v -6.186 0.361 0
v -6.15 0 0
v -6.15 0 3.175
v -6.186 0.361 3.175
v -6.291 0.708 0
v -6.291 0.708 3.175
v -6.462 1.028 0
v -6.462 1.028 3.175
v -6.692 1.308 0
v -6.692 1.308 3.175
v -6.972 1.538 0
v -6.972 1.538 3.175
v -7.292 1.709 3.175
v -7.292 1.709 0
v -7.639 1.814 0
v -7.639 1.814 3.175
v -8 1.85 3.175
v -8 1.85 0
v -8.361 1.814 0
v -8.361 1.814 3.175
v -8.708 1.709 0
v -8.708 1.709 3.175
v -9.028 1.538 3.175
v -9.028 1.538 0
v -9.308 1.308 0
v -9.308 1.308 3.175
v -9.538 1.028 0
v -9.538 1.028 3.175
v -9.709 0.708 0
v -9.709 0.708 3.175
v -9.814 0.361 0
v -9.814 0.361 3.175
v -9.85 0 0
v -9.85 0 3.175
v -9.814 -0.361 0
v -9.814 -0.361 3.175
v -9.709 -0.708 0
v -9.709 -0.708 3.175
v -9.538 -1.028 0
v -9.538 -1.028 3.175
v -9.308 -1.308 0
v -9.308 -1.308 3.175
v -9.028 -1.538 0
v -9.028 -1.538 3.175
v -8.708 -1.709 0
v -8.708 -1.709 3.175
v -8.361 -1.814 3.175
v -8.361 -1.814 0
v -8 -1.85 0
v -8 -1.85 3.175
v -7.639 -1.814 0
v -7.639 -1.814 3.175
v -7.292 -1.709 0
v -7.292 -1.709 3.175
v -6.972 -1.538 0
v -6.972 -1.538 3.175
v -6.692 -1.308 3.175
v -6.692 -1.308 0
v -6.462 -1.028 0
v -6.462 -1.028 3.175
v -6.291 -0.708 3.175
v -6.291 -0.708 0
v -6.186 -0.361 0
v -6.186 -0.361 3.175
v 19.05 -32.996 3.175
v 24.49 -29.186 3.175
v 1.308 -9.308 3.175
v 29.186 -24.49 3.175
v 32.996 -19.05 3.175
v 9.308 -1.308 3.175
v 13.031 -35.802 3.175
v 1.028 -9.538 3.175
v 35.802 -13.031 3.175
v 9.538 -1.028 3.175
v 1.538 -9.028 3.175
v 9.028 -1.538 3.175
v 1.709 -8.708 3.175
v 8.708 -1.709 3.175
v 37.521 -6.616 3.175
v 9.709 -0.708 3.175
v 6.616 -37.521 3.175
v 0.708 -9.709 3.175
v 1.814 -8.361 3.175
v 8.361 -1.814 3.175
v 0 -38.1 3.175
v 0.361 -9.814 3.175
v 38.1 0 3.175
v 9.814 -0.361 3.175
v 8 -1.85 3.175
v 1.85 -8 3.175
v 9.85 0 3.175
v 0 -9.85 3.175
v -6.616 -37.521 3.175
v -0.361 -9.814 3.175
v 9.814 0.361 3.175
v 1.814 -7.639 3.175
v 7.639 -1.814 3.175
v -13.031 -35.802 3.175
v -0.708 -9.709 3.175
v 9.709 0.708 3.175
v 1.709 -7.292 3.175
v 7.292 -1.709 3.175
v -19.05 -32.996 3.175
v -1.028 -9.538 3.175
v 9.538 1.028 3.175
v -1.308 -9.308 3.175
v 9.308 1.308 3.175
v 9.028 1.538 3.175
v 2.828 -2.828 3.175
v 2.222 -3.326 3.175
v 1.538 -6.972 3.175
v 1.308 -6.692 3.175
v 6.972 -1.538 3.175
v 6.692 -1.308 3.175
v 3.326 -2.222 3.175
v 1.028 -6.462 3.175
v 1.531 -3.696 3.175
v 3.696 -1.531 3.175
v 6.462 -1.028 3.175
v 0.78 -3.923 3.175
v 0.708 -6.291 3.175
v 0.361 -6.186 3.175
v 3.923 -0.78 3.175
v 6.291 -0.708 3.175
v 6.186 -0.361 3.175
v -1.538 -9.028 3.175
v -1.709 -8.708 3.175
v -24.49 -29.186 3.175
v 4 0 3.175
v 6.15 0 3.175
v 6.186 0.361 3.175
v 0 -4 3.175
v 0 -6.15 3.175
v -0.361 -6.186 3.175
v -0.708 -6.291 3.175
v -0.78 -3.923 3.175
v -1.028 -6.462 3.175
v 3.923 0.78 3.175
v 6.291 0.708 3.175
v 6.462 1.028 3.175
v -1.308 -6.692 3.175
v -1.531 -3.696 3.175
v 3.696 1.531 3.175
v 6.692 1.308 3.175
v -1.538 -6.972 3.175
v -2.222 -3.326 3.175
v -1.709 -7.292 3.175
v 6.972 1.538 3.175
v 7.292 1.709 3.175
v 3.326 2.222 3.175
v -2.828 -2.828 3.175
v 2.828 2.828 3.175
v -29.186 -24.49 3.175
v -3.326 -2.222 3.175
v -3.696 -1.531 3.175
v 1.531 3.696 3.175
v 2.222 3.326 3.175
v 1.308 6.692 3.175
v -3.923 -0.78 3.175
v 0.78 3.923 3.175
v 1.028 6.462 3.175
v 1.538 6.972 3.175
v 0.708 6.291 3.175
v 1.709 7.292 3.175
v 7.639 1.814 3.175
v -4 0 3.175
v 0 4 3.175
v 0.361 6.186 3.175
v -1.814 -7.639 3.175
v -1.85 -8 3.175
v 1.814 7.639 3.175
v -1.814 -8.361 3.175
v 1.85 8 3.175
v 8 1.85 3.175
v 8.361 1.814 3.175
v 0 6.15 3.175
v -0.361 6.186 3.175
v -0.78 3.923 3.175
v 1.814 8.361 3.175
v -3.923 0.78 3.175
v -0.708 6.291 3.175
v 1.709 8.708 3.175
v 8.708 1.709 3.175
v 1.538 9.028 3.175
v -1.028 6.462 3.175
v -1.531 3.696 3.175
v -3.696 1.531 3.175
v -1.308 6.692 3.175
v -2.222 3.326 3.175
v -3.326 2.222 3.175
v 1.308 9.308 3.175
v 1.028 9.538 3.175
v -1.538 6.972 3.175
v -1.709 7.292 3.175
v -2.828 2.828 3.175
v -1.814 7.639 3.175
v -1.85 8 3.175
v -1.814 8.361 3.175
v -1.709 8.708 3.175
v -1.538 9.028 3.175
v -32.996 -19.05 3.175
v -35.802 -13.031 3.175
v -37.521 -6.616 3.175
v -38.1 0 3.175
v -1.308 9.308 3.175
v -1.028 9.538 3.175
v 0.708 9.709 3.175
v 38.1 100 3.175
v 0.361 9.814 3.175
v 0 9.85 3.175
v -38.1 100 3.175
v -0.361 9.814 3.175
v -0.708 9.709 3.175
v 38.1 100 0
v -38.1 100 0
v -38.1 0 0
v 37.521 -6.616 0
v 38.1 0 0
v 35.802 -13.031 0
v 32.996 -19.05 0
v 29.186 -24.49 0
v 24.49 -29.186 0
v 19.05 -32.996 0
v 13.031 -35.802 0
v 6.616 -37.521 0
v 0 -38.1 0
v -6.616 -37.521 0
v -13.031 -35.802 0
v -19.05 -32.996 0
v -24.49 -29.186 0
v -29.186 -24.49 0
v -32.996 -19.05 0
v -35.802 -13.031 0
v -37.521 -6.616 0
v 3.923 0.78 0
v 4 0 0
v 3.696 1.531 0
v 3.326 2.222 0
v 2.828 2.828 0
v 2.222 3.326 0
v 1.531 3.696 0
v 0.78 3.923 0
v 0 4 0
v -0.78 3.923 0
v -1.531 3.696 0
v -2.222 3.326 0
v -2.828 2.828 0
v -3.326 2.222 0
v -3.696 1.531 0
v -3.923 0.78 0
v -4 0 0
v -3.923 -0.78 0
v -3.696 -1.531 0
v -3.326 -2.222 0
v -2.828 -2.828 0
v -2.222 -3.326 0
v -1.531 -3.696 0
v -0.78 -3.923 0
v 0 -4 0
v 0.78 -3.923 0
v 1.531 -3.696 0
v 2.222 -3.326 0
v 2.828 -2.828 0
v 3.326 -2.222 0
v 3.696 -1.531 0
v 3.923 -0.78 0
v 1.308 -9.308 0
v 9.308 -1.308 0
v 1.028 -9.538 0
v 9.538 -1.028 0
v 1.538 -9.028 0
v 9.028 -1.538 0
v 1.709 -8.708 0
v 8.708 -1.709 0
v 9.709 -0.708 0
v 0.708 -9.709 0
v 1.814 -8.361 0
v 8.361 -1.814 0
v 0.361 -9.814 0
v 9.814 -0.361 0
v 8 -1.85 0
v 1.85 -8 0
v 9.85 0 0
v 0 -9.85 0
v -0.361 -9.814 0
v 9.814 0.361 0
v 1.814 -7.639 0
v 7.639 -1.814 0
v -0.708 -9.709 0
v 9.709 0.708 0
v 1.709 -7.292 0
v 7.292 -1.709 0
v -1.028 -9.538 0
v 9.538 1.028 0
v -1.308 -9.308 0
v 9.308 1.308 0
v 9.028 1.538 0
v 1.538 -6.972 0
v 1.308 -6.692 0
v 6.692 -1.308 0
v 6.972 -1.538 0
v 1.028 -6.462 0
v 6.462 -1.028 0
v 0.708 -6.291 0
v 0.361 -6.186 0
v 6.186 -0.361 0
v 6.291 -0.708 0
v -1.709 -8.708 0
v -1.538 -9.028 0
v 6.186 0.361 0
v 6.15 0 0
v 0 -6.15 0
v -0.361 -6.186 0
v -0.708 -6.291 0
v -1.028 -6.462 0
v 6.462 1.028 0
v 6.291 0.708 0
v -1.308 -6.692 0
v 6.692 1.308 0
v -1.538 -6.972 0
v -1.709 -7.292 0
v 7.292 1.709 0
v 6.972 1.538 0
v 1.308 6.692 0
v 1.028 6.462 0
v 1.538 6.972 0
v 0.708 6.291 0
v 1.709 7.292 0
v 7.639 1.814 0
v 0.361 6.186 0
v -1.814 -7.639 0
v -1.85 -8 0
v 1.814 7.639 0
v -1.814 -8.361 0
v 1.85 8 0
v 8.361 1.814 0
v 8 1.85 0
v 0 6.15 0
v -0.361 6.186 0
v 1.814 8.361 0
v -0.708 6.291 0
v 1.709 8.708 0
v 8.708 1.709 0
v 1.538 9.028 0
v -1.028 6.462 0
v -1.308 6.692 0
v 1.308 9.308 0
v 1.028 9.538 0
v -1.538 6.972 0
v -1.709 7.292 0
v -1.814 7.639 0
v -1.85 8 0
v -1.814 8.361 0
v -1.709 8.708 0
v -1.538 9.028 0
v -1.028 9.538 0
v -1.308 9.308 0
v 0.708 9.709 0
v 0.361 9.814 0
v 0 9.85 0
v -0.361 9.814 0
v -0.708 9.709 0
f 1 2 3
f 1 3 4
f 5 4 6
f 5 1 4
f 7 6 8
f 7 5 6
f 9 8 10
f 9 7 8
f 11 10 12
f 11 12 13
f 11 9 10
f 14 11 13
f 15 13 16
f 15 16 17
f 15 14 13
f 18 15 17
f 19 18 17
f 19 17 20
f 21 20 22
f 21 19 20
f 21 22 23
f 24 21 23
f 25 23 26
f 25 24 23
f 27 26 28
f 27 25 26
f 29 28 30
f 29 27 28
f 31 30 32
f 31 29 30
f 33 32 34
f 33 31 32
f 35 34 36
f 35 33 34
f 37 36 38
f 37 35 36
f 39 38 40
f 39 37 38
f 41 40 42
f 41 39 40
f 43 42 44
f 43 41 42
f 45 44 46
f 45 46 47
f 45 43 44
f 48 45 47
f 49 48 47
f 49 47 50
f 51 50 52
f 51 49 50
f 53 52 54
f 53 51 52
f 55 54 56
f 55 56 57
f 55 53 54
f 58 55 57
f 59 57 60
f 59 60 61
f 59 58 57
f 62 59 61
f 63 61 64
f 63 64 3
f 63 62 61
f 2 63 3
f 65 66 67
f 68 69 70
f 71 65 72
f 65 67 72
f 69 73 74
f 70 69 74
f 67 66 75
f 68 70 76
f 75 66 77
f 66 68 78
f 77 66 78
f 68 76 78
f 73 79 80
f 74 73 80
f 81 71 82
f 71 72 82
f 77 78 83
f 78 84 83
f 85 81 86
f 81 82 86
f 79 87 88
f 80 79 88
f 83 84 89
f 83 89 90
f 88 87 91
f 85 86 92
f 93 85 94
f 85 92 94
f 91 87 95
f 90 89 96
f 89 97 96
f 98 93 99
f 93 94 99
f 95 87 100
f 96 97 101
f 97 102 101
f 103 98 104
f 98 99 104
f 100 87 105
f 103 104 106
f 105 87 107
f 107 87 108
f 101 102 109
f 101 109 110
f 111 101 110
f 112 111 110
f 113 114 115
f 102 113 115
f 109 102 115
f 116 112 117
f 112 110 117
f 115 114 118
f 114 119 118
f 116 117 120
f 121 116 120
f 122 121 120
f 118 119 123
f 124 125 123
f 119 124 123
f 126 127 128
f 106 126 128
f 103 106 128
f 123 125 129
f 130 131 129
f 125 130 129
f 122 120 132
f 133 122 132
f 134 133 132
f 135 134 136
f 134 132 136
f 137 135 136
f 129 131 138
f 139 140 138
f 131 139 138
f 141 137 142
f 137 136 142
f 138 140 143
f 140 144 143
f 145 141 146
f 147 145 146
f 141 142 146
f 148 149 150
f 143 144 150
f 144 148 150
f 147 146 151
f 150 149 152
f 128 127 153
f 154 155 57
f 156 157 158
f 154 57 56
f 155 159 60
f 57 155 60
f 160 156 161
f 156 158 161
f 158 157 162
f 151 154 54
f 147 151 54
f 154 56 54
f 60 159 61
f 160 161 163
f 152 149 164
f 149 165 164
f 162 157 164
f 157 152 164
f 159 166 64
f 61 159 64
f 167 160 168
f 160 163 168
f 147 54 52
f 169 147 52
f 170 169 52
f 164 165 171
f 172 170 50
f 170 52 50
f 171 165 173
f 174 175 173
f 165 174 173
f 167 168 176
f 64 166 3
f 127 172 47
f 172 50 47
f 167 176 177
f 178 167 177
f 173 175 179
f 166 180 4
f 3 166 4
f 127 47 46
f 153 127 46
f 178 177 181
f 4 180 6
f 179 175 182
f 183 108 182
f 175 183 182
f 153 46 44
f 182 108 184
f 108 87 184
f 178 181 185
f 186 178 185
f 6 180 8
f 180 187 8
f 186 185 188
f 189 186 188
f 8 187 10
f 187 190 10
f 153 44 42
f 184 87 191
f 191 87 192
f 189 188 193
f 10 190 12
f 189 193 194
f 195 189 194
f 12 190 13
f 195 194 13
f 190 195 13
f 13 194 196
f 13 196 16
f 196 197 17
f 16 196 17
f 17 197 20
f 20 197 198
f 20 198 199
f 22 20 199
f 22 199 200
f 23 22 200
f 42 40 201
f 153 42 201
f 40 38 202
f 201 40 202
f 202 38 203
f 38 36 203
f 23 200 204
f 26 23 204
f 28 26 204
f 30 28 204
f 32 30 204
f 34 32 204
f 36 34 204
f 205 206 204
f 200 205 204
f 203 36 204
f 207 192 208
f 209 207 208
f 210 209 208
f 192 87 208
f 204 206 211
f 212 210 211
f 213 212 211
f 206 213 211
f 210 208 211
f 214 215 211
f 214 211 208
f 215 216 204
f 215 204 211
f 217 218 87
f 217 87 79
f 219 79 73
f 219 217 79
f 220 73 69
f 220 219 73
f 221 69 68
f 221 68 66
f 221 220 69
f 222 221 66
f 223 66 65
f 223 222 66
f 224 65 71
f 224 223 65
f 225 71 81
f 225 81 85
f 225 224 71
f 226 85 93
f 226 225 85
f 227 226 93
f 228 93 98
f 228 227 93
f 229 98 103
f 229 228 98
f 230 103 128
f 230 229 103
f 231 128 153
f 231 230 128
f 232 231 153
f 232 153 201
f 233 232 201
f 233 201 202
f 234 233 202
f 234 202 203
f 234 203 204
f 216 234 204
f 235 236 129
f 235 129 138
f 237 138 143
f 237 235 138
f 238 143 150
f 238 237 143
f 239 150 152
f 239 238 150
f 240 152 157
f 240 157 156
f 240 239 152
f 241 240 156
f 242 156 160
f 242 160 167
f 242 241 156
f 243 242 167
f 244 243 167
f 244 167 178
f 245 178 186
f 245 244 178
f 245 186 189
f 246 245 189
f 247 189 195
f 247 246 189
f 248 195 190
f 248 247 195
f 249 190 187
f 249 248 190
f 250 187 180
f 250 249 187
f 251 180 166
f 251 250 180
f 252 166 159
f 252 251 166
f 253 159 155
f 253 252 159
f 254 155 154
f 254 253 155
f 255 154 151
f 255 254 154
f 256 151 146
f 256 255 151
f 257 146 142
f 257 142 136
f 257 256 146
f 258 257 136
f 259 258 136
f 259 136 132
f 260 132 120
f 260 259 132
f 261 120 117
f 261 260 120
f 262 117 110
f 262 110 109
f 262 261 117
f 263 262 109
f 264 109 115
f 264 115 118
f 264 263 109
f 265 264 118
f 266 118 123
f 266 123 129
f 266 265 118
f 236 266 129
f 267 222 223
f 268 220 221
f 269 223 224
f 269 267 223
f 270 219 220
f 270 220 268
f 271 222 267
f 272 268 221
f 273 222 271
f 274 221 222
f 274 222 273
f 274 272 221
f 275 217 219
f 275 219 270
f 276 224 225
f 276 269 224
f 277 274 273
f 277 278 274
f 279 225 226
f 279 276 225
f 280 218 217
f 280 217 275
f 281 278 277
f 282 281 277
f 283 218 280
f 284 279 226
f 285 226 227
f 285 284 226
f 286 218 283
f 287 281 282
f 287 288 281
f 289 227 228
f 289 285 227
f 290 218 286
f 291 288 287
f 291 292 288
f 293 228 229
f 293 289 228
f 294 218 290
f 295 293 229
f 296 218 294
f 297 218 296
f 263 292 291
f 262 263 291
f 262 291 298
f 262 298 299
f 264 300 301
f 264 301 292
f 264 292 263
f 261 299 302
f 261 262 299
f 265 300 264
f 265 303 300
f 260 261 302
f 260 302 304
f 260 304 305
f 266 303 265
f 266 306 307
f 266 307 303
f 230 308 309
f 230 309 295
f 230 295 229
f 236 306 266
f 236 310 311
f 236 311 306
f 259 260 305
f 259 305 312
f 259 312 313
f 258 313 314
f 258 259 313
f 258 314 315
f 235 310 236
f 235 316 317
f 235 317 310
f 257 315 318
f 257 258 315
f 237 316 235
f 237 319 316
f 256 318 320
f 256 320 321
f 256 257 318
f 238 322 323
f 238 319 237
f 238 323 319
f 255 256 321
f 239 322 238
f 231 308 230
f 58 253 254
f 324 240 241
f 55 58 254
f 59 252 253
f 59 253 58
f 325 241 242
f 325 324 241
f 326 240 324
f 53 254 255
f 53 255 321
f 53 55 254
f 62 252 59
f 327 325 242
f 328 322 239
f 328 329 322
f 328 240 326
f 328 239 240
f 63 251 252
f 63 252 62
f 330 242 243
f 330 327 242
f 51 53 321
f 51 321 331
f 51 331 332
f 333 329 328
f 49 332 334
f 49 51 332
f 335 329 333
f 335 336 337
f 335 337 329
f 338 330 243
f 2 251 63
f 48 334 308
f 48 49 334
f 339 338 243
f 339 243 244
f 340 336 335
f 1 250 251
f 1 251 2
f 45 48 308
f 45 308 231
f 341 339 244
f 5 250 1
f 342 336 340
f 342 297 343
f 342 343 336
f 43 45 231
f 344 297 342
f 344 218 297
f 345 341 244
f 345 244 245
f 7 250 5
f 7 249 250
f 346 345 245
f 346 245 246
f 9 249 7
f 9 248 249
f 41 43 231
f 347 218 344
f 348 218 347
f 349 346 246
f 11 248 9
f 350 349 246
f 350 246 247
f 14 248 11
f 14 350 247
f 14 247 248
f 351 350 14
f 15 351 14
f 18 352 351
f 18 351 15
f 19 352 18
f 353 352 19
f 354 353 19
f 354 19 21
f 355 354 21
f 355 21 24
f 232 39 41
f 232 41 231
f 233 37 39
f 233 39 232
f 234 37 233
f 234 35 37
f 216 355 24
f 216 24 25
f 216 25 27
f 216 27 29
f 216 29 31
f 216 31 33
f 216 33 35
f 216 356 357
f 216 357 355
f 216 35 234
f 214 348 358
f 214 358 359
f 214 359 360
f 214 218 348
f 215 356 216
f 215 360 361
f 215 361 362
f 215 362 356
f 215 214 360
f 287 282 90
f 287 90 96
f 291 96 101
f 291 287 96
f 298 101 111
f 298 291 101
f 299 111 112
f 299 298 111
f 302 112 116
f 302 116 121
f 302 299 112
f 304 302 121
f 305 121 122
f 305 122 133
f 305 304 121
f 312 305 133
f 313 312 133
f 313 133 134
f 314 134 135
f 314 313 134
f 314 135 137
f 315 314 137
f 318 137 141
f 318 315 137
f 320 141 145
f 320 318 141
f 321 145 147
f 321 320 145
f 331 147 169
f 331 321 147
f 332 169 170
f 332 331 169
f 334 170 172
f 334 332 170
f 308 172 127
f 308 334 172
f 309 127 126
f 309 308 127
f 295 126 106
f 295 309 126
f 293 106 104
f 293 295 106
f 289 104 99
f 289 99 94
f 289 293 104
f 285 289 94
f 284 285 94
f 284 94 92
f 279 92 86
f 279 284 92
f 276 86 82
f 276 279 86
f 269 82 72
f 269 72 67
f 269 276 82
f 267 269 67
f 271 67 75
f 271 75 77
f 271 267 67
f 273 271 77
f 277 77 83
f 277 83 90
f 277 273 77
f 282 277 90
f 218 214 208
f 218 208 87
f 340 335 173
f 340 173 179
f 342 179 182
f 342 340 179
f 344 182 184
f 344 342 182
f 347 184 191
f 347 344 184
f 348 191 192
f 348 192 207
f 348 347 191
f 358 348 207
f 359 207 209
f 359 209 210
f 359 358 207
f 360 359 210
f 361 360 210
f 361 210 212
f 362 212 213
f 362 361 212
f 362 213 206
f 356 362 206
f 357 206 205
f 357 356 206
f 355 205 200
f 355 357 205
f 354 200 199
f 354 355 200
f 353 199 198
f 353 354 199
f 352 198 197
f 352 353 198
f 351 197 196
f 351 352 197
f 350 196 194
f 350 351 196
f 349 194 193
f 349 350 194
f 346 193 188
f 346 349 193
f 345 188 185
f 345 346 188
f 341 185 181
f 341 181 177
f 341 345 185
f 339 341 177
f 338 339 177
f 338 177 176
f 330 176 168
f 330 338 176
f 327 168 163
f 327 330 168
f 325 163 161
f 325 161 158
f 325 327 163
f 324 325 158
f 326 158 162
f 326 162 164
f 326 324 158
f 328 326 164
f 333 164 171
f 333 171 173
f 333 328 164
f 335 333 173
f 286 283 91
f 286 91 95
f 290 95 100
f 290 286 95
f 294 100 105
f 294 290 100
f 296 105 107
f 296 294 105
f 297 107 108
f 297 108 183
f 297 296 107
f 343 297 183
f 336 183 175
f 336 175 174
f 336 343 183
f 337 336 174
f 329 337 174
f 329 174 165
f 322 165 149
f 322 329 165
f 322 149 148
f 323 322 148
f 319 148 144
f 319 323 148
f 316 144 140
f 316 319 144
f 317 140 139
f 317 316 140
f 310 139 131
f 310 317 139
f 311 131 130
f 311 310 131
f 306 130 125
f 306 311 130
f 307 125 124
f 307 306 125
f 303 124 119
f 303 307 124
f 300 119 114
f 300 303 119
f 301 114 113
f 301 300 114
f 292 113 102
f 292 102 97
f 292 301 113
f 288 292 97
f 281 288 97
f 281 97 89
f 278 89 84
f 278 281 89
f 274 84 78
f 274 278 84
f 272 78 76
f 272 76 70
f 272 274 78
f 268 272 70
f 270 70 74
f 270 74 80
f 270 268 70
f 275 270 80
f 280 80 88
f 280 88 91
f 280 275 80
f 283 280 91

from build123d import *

# Parameters (mm, degrees)
SKETCH1_R           = 4
SKETCH1_R_2         = 1.85
BOSS_EXTRUDE1_DEPTH = 3.175


with BuildPart() as part:
    # Sketch1 → Boss-Extrude1 (new body)
    with BuildSketch(Plane.XY):
        with BuildLine():
            Line((-38.1, 100), (38.1, 100))
            Line((38.1, 100), (38.1, 0))
            ThreePointArc((38.1, 0), (0, -38.1), (-38.1, 0))
            Line((-38.1, 0), (-38.1, 100))
        make_face()
        Circle(SKETCH1_R, mode=Mode.SUBTRACT)
        with Locations((-8, 0)):
            Circle(SKETCH1_R_2, mode=Mode.SUBTRACT)
        with Locations((0, -8)):
            Circle(SKETCH1_R_2, mode=Mode.SUBTRACT)
        with Locations((0, 8)):
            Circle(SKETCH1_R_2, mode=Mode.SUBTRACT)
        with Locations((8, 0)):
            Circle(SKETCH1_R_2, mode=Mode.SUBTRACT)
    extrude(amount=BOSS_EXTRUDE1_DEPTH)


solid = part.part
